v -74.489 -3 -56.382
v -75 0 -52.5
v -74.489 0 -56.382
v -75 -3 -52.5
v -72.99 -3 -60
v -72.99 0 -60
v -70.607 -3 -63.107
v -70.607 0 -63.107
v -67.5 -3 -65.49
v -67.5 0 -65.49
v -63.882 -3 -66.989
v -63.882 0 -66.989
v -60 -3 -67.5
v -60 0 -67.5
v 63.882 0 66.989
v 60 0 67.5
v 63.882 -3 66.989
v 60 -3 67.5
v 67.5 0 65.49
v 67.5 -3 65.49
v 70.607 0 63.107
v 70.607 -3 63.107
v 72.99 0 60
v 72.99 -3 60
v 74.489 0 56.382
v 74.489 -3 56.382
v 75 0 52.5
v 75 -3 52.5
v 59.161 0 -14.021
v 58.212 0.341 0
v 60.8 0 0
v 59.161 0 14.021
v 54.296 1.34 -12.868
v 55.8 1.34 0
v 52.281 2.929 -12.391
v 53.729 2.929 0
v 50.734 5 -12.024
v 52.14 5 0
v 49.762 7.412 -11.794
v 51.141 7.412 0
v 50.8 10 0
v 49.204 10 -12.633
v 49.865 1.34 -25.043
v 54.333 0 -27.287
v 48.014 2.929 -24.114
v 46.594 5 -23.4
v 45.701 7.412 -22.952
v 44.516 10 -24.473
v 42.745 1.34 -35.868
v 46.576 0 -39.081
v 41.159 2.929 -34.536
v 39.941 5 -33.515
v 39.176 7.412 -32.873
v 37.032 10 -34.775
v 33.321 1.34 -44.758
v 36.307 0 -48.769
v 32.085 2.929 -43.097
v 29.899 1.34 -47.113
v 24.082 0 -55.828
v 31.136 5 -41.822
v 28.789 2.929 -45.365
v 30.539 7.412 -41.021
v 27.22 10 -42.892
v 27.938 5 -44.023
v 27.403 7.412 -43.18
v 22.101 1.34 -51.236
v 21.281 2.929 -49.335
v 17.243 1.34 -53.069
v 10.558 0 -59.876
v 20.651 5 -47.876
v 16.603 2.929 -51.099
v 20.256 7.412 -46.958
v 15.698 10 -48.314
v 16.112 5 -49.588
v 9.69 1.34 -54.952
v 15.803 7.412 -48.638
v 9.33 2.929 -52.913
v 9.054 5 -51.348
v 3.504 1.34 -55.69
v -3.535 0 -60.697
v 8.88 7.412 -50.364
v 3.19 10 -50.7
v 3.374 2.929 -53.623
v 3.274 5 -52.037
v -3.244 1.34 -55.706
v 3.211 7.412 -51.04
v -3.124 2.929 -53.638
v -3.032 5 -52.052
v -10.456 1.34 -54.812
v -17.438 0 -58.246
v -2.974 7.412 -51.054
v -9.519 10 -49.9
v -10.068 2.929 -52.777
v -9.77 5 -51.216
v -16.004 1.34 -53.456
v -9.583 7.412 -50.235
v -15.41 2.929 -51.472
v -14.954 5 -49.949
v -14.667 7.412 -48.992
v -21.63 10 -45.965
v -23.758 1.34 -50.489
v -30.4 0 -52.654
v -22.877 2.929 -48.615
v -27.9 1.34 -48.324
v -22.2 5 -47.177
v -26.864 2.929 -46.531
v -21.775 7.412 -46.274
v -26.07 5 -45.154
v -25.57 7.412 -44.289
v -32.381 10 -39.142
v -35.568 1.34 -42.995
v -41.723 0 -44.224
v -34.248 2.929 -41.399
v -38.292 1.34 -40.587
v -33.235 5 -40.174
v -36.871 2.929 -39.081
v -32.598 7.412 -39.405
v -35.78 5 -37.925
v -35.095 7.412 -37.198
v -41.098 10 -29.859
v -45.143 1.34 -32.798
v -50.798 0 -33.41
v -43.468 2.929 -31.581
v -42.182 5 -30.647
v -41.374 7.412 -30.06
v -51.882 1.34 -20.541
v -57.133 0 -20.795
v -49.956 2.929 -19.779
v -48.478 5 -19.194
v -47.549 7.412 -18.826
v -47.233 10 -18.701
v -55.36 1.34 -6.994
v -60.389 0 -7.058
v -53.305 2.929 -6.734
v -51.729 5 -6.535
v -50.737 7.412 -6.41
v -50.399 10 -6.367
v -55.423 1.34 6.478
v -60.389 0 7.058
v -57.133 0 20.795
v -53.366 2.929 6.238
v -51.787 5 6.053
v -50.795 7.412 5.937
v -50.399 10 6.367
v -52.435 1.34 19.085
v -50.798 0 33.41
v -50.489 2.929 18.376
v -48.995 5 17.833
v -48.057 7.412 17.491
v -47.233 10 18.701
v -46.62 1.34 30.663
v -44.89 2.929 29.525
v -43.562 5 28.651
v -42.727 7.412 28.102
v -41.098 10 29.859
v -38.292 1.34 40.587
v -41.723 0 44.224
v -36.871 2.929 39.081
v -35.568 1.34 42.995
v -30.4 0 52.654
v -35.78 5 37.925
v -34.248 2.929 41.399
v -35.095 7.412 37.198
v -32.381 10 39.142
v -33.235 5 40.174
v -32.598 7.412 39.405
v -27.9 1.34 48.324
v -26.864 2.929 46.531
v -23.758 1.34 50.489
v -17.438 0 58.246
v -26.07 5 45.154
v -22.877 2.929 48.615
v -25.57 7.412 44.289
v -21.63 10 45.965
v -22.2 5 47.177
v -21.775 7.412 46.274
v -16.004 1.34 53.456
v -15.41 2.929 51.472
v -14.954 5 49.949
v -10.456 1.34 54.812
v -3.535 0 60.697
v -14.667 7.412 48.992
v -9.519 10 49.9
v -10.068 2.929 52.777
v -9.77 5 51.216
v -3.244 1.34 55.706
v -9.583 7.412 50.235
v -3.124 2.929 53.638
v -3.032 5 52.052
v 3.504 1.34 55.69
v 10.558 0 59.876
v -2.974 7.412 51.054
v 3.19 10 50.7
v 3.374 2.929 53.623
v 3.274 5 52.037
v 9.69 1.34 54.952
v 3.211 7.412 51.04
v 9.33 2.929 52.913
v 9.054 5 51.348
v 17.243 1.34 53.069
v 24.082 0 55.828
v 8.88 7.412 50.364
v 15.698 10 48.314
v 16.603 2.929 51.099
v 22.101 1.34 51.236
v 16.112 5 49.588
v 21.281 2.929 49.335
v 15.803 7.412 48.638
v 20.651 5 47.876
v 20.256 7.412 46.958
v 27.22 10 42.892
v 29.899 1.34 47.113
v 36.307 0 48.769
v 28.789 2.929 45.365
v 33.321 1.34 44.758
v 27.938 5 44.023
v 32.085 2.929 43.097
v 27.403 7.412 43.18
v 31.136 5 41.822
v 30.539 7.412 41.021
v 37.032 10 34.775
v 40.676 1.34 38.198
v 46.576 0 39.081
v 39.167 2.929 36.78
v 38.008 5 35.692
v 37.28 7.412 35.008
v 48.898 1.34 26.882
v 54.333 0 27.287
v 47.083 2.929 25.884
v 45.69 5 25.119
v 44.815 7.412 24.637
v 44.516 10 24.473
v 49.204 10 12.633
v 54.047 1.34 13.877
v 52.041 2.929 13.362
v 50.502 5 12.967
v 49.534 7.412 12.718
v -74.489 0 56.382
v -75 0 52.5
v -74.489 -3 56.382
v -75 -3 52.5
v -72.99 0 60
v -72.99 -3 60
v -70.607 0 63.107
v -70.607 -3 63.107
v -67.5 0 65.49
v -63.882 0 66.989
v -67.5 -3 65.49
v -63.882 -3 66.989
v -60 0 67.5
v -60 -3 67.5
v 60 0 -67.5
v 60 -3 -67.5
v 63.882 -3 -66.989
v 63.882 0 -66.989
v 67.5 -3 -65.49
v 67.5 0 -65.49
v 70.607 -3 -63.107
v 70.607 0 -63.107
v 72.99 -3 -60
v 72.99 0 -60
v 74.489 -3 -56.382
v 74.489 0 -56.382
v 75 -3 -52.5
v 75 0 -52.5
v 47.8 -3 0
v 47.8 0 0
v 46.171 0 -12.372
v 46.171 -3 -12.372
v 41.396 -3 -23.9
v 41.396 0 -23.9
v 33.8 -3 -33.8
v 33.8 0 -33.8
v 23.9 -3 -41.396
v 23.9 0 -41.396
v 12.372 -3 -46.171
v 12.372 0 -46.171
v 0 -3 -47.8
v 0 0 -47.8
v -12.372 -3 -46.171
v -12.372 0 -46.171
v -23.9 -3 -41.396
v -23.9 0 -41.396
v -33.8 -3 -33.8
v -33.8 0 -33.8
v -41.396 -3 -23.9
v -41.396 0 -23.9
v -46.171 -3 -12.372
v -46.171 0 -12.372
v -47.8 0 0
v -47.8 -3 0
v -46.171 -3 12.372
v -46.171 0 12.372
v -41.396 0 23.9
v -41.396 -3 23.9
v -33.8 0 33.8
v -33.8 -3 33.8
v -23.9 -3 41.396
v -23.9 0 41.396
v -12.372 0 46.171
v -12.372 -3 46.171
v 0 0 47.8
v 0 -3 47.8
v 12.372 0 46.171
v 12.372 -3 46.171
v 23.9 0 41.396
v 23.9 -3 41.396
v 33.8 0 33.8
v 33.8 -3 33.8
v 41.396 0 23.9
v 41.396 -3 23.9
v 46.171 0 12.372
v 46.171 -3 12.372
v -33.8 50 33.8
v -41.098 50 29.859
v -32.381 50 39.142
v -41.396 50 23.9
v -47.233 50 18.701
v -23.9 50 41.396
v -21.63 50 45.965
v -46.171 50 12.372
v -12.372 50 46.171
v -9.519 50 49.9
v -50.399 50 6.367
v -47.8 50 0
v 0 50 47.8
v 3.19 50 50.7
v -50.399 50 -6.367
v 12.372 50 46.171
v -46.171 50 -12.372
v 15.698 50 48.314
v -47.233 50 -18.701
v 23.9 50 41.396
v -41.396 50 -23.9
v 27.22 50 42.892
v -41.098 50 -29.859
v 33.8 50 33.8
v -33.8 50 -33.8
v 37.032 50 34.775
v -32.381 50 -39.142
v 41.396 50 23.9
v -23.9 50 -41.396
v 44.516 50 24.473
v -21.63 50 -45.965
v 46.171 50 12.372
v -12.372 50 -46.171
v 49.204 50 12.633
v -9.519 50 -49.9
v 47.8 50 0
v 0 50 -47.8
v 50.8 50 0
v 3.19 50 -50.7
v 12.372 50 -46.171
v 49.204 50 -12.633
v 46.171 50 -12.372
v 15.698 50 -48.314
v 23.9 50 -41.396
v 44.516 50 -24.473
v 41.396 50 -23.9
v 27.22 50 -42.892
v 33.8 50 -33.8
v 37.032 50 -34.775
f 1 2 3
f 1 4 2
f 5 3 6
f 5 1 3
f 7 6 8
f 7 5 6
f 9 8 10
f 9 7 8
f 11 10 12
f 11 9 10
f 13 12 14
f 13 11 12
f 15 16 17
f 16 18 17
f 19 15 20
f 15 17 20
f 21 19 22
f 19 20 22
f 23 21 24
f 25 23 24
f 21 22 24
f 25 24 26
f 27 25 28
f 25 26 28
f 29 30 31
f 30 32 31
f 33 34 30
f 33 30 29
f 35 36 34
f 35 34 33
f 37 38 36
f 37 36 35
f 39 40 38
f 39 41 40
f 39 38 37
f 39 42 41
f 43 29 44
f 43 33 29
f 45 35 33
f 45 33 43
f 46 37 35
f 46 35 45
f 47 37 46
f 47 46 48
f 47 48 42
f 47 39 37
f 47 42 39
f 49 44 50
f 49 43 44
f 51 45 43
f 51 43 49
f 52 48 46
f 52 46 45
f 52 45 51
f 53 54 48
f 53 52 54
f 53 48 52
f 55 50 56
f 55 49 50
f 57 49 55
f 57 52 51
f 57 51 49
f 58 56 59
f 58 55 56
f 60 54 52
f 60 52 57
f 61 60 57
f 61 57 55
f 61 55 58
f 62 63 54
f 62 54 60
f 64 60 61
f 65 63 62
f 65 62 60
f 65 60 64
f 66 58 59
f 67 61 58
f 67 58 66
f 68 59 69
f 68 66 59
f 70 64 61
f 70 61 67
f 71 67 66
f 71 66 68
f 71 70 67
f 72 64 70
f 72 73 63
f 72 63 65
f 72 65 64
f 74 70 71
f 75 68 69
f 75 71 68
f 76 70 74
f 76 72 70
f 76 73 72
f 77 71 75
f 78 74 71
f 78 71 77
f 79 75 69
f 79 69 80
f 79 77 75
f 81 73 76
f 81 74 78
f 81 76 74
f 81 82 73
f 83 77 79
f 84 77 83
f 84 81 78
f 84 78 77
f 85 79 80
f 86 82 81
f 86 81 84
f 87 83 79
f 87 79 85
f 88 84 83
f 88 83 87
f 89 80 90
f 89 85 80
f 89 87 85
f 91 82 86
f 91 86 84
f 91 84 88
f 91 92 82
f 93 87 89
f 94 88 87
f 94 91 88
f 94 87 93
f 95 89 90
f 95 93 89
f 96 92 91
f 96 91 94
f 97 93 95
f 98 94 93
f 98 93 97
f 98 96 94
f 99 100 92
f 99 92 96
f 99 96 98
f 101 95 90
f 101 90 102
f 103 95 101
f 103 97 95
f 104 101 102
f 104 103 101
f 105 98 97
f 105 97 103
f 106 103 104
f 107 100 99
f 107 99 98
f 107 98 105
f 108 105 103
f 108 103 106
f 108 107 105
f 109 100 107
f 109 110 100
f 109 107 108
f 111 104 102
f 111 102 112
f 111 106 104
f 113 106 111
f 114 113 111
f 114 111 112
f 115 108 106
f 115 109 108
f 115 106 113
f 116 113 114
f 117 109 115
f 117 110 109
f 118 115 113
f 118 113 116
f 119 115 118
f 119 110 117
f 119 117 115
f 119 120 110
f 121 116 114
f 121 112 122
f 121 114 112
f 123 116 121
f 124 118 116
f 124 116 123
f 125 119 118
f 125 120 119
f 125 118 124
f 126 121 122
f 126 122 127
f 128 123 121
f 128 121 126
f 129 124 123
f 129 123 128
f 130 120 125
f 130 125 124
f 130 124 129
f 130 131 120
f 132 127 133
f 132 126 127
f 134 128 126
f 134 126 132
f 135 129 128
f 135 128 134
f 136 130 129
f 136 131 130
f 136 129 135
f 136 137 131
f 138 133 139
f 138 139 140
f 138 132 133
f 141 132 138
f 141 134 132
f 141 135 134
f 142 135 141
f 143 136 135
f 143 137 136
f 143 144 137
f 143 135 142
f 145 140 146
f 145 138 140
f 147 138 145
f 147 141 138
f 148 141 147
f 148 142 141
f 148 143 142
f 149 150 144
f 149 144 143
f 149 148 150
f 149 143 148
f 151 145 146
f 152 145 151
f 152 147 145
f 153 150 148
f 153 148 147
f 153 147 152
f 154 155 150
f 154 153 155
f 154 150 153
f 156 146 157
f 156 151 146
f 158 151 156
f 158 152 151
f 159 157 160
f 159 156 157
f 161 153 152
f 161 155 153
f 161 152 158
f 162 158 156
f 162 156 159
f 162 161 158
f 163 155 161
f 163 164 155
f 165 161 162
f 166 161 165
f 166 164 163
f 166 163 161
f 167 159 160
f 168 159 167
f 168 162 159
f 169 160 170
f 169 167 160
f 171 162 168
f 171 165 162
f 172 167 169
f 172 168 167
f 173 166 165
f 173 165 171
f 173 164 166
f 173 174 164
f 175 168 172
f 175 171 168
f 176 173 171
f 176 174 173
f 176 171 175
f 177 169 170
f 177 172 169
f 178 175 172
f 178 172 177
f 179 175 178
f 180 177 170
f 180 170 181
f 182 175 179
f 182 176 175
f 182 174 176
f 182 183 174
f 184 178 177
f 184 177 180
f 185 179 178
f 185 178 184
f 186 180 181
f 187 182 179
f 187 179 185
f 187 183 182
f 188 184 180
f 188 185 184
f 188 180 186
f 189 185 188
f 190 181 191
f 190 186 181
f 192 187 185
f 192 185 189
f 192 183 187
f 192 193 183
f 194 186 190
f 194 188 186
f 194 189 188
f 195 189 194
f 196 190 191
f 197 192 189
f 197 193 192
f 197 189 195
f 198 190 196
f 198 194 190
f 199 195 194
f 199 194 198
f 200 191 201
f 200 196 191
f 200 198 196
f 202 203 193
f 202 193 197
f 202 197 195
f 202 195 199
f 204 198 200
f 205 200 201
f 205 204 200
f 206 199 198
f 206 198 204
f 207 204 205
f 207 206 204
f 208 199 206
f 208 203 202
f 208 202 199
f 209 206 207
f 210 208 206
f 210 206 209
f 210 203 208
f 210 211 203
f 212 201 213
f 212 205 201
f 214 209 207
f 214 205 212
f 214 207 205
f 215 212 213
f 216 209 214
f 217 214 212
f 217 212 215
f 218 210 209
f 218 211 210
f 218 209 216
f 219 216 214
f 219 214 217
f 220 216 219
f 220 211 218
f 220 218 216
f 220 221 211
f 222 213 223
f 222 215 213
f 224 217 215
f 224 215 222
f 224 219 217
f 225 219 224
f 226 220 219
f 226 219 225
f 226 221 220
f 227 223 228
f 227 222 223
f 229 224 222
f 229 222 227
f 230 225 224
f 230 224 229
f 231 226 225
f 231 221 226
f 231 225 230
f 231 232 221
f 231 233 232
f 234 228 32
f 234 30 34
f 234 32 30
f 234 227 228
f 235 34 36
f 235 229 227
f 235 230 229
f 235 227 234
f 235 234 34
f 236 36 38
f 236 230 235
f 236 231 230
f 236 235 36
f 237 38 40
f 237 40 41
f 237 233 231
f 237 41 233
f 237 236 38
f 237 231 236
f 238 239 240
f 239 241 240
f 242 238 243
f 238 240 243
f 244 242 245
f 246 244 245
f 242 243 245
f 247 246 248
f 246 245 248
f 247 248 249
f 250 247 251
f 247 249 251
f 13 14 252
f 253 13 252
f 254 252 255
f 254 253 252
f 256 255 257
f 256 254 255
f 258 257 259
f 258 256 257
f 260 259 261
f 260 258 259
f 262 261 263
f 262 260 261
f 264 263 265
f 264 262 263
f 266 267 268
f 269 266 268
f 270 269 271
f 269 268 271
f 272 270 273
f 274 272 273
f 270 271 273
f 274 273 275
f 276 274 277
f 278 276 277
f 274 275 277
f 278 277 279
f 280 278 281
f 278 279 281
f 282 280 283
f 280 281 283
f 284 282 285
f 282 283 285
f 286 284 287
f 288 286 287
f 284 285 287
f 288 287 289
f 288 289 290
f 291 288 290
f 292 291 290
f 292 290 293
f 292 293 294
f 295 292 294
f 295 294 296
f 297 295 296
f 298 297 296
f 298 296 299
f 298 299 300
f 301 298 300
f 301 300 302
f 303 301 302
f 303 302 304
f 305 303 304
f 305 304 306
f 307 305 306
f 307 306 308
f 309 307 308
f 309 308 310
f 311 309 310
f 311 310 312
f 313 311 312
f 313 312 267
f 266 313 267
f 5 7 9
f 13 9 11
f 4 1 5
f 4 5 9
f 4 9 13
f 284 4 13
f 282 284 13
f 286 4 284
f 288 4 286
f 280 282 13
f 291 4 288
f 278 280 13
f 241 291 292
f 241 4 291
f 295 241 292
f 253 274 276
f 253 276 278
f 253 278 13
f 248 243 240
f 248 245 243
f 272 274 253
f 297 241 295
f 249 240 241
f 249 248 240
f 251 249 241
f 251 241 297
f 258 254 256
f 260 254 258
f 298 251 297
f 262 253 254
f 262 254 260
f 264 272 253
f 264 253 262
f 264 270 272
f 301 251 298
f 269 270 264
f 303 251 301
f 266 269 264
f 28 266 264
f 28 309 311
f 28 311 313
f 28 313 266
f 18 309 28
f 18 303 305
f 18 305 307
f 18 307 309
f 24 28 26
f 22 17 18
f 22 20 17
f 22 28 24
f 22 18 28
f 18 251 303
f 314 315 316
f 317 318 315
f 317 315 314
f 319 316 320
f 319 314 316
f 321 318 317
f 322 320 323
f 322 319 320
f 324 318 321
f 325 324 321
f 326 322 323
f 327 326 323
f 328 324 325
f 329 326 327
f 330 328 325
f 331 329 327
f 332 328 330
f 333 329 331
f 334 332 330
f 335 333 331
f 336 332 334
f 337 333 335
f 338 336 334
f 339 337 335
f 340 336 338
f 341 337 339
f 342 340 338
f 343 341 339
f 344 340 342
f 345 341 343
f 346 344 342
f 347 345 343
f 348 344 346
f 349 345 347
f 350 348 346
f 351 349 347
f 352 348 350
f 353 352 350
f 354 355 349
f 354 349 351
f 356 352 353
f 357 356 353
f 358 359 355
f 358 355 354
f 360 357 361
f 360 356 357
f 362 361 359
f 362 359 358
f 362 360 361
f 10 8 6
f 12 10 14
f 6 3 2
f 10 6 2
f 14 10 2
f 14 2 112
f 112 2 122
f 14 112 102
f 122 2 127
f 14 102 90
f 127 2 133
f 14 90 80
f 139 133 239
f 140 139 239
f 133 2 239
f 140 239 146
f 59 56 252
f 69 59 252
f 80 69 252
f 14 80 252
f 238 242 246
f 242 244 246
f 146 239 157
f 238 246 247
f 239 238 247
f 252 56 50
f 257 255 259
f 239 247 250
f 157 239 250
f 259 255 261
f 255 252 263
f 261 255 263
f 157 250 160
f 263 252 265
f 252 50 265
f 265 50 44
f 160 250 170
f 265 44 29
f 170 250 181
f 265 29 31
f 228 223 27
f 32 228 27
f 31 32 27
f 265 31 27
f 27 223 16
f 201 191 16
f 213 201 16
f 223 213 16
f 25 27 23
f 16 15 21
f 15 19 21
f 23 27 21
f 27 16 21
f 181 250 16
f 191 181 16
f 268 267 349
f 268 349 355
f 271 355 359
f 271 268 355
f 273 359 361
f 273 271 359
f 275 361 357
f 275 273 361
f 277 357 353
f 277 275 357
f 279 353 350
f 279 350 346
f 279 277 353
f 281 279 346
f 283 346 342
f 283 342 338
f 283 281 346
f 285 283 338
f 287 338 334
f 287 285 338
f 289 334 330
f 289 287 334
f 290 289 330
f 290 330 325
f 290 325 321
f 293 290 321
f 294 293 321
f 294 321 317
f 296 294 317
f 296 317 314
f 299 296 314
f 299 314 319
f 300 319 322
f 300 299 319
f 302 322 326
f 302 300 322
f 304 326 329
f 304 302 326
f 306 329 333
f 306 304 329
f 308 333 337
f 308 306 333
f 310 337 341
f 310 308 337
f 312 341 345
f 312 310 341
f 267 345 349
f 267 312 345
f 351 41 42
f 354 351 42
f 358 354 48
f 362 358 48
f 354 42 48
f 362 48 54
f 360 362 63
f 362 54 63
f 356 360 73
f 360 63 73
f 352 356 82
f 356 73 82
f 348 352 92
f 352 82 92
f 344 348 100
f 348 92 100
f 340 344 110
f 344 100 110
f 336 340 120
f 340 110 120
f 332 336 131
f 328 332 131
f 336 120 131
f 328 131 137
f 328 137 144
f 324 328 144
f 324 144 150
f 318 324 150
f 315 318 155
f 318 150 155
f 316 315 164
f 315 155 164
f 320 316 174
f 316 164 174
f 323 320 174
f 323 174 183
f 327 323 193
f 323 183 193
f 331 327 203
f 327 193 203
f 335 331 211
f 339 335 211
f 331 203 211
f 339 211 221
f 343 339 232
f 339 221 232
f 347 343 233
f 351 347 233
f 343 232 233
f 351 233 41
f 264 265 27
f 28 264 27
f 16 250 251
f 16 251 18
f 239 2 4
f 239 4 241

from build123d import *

# Parameters (mm, degrees)
ESBO_O1_R                = 50.8
ESBO_O1_R_2              = 47.8
EXTRUS_O_FINA1_DEPTH     = 50
ESBO_O2_W                = 150
ESBO_O2_H                = 135
RESSALTO_EXTRUS_O1_DEPTH = 3
FILETE1_R                = 10
FILETE2_R                = 15
ESBO_O3_R                = 47.8
CORTE_EXTRUS_O1_DEPTH    = 113.611056296


with BuildPart() as part:
    # Esboço1 → Extrusão-Fina1 (new body)
    with BuildSketch(Plane(origin=(0, 0, 0), x_dir=(1, 0, 0), z_dir=(0, 1, 0))):
        Circle(ESBO_O1_R)
        Circle(ESBO_O1_R_2, mode=Mode.SUBTRACT)
    extrude(amount=EXTRUS_O_FINA1_DEPTH)

    # Esboço2 → Ressalto-extrusão1 (add)
    with BuildSketch(Plane.XZ):
        Rectangle(ESBO_O2_W, ESBO_O2_H)
    extrude(amount=RESSALTO_EXTRUS_O1_DEPTH)

    # Filete1
    filete1_edges = [part.edges().sort_by_distance(p)[0] for p in [
        (-50.8, 0, 0),
    ]]
    fillet(filete1_edges, radius=FILETE1_R)

    # Filete2
    filete2_edges = [part.edges().sort_by_distance(p)[0] for p in [
        (-75, -1.5, -67.5),
        (75, -1.5, -67.5),
        (75, -1.5, 67.5),
        (-75, -1.5, 67.5),
    ]]
    fillet(filete2_edges, radius=FILETE2_R)

    # Esboço3 → Corte-extrusão1 (cut, through all)
    with BuildSketch(Plane(origin=(0, 0, 0), x_dir=(1, 0, 0), z_dir=(0, 1, 0))):
        Circle(ESBO_O3_R)
    extrude(amount=-CORTE_EXTRUS_O1_DEPTH, mode=Mode.SUBTRACT)


solid = part.part
